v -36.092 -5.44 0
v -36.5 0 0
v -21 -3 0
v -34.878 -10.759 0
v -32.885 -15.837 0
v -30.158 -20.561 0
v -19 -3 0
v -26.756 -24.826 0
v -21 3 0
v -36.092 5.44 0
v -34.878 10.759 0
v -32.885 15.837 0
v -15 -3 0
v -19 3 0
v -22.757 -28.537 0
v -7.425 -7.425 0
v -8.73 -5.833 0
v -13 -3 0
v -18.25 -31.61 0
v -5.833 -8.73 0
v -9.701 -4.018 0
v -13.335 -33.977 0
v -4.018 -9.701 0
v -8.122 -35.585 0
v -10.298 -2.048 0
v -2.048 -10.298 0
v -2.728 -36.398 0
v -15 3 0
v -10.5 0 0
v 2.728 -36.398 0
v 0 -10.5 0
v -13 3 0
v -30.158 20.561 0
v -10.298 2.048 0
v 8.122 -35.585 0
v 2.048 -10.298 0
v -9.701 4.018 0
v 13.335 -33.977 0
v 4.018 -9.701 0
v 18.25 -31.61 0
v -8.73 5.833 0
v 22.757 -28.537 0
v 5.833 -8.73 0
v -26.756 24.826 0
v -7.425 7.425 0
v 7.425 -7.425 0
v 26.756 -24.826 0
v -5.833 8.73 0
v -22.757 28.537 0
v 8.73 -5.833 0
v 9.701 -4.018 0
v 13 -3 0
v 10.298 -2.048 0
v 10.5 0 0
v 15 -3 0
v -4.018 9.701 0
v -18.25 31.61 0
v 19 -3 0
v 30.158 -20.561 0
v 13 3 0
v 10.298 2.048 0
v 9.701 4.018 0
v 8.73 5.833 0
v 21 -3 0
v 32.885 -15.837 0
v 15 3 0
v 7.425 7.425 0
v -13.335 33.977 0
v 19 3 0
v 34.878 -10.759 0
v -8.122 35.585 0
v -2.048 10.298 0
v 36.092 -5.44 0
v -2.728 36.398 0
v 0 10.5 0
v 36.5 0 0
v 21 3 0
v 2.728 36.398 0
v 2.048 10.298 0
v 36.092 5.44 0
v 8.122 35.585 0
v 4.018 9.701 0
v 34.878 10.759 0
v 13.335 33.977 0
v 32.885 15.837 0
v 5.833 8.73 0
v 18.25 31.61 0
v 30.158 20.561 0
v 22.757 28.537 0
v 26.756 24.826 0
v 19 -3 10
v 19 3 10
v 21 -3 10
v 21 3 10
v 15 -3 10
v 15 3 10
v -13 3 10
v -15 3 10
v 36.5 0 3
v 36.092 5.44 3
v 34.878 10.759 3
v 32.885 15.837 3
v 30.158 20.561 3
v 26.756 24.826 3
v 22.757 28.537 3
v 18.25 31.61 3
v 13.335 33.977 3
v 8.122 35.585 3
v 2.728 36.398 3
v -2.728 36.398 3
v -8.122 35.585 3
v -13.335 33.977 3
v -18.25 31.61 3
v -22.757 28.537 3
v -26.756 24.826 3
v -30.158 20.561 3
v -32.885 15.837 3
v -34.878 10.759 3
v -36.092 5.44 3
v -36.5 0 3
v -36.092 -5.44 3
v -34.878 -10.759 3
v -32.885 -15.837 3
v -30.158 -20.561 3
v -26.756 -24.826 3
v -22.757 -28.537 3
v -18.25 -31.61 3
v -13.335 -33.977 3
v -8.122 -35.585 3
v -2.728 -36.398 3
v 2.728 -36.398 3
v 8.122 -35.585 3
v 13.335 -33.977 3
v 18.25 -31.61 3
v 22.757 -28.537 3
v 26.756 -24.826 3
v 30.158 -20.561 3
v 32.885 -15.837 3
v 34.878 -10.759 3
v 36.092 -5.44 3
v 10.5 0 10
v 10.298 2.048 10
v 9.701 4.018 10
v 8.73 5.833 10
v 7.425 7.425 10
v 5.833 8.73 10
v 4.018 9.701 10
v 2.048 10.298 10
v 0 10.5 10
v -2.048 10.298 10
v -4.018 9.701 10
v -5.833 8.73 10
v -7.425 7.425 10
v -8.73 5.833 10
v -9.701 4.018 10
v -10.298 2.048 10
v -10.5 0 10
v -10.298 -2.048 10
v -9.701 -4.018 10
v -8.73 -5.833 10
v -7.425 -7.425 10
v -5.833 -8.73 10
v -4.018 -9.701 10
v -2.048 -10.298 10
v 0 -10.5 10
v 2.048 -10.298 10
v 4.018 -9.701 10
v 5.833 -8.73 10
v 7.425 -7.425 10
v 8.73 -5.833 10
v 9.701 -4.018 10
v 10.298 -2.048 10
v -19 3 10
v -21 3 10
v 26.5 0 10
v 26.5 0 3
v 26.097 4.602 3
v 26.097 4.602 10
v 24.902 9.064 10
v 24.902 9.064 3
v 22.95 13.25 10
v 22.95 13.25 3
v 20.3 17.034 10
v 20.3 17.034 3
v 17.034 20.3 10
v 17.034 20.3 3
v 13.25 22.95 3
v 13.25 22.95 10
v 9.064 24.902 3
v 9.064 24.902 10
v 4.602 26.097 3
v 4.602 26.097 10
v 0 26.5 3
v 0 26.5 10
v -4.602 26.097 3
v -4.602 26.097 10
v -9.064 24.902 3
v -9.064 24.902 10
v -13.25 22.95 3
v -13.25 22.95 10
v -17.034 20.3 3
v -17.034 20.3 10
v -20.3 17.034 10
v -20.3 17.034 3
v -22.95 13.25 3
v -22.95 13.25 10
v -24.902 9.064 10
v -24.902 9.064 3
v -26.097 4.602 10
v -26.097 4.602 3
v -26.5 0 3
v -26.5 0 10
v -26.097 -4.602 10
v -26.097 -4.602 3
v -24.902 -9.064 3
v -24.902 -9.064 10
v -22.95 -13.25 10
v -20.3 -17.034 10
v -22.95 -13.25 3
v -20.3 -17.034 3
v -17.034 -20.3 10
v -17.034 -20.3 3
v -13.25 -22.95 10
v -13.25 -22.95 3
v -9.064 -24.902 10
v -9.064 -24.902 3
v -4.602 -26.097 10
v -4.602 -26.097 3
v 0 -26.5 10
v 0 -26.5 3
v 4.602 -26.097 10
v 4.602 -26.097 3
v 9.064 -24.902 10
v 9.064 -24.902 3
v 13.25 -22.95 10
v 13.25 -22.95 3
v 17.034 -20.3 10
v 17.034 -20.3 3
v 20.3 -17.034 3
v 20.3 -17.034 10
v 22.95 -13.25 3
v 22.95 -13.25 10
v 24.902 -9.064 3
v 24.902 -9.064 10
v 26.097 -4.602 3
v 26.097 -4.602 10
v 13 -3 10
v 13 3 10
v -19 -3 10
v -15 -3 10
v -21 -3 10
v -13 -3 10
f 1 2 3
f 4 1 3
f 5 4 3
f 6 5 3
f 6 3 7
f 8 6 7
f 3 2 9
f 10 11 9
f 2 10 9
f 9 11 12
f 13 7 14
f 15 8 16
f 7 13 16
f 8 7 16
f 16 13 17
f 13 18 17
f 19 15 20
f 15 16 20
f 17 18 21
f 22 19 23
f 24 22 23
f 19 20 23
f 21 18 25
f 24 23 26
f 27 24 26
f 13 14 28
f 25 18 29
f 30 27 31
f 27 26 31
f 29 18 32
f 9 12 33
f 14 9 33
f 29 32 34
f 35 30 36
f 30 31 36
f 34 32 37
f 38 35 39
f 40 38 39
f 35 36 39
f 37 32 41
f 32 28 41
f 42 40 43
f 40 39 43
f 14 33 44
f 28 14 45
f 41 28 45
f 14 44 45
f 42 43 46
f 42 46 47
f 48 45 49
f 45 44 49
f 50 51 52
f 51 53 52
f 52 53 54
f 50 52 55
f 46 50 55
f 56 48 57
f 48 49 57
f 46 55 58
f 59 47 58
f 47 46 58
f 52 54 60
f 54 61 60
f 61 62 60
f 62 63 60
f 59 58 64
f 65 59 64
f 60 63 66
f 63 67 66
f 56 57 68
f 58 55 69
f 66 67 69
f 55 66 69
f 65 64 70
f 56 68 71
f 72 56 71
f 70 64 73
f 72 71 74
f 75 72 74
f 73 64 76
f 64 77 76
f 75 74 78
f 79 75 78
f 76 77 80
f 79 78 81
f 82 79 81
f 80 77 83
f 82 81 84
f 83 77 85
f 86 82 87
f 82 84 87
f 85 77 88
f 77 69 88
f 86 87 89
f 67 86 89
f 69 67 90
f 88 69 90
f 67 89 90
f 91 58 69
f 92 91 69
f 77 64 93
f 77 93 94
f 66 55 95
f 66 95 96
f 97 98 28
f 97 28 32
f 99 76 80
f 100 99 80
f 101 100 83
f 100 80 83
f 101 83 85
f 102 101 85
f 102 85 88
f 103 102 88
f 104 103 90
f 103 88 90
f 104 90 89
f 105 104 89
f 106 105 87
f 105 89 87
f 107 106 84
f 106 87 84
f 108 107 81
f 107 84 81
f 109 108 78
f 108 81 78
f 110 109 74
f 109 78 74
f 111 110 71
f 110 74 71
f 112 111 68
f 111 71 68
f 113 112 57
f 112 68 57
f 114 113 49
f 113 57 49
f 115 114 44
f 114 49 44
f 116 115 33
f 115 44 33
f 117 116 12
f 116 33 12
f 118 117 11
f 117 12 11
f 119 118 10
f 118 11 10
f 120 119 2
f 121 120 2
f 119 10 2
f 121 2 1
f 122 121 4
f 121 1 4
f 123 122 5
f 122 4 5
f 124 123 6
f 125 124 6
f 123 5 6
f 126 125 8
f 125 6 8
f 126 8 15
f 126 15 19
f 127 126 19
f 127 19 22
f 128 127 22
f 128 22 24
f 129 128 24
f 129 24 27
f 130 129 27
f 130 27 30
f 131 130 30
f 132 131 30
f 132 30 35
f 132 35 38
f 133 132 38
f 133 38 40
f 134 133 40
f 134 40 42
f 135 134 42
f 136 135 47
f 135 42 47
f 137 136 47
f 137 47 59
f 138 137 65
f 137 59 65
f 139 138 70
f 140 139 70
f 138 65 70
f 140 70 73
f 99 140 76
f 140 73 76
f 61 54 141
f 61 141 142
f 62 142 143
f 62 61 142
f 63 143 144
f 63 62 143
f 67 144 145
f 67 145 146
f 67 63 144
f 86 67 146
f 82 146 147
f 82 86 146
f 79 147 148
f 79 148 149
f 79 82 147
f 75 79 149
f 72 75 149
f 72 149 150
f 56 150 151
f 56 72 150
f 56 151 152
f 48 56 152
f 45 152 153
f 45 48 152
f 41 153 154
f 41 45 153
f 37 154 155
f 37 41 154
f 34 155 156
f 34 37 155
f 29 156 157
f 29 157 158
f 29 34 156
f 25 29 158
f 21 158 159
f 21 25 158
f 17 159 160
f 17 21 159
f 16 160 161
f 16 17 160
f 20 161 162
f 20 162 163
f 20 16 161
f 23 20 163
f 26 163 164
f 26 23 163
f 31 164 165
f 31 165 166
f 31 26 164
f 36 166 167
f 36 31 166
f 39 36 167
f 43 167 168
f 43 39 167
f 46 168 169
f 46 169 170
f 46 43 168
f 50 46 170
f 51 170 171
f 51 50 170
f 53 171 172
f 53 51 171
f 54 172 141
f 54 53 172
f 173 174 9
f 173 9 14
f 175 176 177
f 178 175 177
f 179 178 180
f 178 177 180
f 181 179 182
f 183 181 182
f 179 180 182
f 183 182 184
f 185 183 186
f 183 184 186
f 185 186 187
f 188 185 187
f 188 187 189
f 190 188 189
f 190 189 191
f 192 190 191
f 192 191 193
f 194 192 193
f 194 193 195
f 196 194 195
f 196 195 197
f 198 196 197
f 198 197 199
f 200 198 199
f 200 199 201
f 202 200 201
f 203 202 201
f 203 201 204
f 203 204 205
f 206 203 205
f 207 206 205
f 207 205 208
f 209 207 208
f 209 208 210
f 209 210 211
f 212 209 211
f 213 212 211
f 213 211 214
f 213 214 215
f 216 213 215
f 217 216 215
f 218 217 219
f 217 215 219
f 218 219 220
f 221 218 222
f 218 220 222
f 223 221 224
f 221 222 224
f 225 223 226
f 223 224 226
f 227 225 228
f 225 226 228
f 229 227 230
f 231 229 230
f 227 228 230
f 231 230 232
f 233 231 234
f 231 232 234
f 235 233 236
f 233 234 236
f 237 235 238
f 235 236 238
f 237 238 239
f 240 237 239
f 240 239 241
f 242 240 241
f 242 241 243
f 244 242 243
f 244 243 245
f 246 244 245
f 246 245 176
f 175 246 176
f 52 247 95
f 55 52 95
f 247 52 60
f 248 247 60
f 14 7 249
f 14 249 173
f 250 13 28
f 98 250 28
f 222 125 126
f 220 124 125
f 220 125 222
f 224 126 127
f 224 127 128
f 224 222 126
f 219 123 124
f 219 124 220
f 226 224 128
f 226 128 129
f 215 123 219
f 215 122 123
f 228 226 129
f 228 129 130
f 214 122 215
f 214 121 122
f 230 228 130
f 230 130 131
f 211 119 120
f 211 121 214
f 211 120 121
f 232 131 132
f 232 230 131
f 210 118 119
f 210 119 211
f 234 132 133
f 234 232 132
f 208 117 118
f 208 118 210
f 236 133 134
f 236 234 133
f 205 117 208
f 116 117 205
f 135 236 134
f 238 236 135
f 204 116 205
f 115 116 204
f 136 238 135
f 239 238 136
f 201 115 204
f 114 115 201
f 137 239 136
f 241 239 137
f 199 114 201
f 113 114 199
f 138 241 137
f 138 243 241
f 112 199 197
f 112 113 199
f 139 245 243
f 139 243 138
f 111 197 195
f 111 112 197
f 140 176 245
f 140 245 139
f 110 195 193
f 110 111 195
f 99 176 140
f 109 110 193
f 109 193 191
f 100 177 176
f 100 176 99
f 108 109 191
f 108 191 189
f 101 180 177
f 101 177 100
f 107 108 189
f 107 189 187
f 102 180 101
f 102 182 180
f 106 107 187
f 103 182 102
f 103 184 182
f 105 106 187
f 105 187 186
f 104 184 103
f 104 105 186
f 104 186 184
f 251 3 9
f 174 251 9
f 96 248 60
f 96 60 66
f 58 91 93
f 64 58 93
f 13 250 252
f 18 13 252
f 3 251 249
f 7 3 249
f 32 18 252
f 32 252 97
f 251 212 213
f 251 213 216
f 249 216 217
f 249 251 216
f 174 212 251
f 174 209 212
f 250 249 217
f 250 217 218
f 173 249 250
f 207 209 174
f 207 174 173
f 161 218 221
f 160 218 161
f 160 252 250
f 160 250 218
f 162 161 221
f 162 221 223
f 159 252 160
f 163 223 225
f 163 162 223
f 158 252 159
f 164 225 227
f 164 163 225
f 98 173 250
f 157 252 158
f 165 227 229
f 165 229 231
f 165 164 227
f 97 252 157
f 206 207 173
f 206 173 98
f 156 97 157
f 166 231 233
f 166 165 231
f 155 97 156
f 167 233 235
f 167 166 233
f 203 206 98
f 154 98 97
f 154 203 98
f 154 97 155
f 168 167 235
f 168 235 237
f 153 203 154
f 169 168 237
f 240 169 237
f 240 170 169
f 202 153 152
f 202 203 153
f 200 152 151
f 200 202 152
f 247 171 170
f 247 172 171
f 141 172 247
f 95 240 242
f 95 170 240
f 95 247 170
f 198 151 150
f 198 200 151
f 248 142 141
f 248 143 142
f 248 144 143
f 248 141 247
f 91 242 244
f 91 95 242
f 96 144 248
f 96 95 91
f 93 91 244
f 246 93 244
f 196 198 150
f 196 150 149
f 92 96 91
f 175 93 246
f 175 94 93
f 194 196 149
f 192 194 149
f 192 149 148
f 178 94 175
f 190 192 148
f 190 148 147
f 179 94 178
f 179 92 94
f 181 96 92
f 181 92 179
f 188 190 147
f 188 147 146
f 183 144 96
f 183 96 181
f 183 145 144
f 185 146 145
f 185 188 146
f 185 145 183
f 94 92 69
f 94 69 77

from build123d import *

# Parameters (mm, degrees)
F0_R     = 36.5
F0_R_2   = 26.5
F1_DEPTH = 3
F0_R_3   = 10.5
F2_DEPTH = 10
F3_W     = 2
F3_H     = 6
F4_DEPTH = 25


with BuildPart() as f1:
    # F0 (on Top) → F1 (new body)
    with BuildSketch(Plane.XY):
        Circle(F0_R)
        Circle(F0_R_2, mode=Mode.SUBTRACT)
    extrude(amount=F1_DEPTH)

    # F0 (on Top) → F2 (join)
    with BuildSketch(Plane.XY):
        Circle(F0_R_2)
        Circle(F0_R_3, mode=Mode.SUBTRACT)
    extrude(amount=F2_DEPTH)

    # F3 (on Top) → F4 (cut)
    with BuildSketch(Plane.XY):
        with Locations((-20, 0)):
            Rectangle(F3_W, F3_H)
        with Locations((-14, 0)):
            Rectangle(F3_W, F3_H)
        with Locations((20, 0)):
            Rectangle(F3_W, F3_H)
        with Locations((14, 0)):
            Rectangle(F3_W, F3_H)
    extrude(amount=F4_DEPTH, mode=Mode.SUBTRACT)


solid = f1.part
